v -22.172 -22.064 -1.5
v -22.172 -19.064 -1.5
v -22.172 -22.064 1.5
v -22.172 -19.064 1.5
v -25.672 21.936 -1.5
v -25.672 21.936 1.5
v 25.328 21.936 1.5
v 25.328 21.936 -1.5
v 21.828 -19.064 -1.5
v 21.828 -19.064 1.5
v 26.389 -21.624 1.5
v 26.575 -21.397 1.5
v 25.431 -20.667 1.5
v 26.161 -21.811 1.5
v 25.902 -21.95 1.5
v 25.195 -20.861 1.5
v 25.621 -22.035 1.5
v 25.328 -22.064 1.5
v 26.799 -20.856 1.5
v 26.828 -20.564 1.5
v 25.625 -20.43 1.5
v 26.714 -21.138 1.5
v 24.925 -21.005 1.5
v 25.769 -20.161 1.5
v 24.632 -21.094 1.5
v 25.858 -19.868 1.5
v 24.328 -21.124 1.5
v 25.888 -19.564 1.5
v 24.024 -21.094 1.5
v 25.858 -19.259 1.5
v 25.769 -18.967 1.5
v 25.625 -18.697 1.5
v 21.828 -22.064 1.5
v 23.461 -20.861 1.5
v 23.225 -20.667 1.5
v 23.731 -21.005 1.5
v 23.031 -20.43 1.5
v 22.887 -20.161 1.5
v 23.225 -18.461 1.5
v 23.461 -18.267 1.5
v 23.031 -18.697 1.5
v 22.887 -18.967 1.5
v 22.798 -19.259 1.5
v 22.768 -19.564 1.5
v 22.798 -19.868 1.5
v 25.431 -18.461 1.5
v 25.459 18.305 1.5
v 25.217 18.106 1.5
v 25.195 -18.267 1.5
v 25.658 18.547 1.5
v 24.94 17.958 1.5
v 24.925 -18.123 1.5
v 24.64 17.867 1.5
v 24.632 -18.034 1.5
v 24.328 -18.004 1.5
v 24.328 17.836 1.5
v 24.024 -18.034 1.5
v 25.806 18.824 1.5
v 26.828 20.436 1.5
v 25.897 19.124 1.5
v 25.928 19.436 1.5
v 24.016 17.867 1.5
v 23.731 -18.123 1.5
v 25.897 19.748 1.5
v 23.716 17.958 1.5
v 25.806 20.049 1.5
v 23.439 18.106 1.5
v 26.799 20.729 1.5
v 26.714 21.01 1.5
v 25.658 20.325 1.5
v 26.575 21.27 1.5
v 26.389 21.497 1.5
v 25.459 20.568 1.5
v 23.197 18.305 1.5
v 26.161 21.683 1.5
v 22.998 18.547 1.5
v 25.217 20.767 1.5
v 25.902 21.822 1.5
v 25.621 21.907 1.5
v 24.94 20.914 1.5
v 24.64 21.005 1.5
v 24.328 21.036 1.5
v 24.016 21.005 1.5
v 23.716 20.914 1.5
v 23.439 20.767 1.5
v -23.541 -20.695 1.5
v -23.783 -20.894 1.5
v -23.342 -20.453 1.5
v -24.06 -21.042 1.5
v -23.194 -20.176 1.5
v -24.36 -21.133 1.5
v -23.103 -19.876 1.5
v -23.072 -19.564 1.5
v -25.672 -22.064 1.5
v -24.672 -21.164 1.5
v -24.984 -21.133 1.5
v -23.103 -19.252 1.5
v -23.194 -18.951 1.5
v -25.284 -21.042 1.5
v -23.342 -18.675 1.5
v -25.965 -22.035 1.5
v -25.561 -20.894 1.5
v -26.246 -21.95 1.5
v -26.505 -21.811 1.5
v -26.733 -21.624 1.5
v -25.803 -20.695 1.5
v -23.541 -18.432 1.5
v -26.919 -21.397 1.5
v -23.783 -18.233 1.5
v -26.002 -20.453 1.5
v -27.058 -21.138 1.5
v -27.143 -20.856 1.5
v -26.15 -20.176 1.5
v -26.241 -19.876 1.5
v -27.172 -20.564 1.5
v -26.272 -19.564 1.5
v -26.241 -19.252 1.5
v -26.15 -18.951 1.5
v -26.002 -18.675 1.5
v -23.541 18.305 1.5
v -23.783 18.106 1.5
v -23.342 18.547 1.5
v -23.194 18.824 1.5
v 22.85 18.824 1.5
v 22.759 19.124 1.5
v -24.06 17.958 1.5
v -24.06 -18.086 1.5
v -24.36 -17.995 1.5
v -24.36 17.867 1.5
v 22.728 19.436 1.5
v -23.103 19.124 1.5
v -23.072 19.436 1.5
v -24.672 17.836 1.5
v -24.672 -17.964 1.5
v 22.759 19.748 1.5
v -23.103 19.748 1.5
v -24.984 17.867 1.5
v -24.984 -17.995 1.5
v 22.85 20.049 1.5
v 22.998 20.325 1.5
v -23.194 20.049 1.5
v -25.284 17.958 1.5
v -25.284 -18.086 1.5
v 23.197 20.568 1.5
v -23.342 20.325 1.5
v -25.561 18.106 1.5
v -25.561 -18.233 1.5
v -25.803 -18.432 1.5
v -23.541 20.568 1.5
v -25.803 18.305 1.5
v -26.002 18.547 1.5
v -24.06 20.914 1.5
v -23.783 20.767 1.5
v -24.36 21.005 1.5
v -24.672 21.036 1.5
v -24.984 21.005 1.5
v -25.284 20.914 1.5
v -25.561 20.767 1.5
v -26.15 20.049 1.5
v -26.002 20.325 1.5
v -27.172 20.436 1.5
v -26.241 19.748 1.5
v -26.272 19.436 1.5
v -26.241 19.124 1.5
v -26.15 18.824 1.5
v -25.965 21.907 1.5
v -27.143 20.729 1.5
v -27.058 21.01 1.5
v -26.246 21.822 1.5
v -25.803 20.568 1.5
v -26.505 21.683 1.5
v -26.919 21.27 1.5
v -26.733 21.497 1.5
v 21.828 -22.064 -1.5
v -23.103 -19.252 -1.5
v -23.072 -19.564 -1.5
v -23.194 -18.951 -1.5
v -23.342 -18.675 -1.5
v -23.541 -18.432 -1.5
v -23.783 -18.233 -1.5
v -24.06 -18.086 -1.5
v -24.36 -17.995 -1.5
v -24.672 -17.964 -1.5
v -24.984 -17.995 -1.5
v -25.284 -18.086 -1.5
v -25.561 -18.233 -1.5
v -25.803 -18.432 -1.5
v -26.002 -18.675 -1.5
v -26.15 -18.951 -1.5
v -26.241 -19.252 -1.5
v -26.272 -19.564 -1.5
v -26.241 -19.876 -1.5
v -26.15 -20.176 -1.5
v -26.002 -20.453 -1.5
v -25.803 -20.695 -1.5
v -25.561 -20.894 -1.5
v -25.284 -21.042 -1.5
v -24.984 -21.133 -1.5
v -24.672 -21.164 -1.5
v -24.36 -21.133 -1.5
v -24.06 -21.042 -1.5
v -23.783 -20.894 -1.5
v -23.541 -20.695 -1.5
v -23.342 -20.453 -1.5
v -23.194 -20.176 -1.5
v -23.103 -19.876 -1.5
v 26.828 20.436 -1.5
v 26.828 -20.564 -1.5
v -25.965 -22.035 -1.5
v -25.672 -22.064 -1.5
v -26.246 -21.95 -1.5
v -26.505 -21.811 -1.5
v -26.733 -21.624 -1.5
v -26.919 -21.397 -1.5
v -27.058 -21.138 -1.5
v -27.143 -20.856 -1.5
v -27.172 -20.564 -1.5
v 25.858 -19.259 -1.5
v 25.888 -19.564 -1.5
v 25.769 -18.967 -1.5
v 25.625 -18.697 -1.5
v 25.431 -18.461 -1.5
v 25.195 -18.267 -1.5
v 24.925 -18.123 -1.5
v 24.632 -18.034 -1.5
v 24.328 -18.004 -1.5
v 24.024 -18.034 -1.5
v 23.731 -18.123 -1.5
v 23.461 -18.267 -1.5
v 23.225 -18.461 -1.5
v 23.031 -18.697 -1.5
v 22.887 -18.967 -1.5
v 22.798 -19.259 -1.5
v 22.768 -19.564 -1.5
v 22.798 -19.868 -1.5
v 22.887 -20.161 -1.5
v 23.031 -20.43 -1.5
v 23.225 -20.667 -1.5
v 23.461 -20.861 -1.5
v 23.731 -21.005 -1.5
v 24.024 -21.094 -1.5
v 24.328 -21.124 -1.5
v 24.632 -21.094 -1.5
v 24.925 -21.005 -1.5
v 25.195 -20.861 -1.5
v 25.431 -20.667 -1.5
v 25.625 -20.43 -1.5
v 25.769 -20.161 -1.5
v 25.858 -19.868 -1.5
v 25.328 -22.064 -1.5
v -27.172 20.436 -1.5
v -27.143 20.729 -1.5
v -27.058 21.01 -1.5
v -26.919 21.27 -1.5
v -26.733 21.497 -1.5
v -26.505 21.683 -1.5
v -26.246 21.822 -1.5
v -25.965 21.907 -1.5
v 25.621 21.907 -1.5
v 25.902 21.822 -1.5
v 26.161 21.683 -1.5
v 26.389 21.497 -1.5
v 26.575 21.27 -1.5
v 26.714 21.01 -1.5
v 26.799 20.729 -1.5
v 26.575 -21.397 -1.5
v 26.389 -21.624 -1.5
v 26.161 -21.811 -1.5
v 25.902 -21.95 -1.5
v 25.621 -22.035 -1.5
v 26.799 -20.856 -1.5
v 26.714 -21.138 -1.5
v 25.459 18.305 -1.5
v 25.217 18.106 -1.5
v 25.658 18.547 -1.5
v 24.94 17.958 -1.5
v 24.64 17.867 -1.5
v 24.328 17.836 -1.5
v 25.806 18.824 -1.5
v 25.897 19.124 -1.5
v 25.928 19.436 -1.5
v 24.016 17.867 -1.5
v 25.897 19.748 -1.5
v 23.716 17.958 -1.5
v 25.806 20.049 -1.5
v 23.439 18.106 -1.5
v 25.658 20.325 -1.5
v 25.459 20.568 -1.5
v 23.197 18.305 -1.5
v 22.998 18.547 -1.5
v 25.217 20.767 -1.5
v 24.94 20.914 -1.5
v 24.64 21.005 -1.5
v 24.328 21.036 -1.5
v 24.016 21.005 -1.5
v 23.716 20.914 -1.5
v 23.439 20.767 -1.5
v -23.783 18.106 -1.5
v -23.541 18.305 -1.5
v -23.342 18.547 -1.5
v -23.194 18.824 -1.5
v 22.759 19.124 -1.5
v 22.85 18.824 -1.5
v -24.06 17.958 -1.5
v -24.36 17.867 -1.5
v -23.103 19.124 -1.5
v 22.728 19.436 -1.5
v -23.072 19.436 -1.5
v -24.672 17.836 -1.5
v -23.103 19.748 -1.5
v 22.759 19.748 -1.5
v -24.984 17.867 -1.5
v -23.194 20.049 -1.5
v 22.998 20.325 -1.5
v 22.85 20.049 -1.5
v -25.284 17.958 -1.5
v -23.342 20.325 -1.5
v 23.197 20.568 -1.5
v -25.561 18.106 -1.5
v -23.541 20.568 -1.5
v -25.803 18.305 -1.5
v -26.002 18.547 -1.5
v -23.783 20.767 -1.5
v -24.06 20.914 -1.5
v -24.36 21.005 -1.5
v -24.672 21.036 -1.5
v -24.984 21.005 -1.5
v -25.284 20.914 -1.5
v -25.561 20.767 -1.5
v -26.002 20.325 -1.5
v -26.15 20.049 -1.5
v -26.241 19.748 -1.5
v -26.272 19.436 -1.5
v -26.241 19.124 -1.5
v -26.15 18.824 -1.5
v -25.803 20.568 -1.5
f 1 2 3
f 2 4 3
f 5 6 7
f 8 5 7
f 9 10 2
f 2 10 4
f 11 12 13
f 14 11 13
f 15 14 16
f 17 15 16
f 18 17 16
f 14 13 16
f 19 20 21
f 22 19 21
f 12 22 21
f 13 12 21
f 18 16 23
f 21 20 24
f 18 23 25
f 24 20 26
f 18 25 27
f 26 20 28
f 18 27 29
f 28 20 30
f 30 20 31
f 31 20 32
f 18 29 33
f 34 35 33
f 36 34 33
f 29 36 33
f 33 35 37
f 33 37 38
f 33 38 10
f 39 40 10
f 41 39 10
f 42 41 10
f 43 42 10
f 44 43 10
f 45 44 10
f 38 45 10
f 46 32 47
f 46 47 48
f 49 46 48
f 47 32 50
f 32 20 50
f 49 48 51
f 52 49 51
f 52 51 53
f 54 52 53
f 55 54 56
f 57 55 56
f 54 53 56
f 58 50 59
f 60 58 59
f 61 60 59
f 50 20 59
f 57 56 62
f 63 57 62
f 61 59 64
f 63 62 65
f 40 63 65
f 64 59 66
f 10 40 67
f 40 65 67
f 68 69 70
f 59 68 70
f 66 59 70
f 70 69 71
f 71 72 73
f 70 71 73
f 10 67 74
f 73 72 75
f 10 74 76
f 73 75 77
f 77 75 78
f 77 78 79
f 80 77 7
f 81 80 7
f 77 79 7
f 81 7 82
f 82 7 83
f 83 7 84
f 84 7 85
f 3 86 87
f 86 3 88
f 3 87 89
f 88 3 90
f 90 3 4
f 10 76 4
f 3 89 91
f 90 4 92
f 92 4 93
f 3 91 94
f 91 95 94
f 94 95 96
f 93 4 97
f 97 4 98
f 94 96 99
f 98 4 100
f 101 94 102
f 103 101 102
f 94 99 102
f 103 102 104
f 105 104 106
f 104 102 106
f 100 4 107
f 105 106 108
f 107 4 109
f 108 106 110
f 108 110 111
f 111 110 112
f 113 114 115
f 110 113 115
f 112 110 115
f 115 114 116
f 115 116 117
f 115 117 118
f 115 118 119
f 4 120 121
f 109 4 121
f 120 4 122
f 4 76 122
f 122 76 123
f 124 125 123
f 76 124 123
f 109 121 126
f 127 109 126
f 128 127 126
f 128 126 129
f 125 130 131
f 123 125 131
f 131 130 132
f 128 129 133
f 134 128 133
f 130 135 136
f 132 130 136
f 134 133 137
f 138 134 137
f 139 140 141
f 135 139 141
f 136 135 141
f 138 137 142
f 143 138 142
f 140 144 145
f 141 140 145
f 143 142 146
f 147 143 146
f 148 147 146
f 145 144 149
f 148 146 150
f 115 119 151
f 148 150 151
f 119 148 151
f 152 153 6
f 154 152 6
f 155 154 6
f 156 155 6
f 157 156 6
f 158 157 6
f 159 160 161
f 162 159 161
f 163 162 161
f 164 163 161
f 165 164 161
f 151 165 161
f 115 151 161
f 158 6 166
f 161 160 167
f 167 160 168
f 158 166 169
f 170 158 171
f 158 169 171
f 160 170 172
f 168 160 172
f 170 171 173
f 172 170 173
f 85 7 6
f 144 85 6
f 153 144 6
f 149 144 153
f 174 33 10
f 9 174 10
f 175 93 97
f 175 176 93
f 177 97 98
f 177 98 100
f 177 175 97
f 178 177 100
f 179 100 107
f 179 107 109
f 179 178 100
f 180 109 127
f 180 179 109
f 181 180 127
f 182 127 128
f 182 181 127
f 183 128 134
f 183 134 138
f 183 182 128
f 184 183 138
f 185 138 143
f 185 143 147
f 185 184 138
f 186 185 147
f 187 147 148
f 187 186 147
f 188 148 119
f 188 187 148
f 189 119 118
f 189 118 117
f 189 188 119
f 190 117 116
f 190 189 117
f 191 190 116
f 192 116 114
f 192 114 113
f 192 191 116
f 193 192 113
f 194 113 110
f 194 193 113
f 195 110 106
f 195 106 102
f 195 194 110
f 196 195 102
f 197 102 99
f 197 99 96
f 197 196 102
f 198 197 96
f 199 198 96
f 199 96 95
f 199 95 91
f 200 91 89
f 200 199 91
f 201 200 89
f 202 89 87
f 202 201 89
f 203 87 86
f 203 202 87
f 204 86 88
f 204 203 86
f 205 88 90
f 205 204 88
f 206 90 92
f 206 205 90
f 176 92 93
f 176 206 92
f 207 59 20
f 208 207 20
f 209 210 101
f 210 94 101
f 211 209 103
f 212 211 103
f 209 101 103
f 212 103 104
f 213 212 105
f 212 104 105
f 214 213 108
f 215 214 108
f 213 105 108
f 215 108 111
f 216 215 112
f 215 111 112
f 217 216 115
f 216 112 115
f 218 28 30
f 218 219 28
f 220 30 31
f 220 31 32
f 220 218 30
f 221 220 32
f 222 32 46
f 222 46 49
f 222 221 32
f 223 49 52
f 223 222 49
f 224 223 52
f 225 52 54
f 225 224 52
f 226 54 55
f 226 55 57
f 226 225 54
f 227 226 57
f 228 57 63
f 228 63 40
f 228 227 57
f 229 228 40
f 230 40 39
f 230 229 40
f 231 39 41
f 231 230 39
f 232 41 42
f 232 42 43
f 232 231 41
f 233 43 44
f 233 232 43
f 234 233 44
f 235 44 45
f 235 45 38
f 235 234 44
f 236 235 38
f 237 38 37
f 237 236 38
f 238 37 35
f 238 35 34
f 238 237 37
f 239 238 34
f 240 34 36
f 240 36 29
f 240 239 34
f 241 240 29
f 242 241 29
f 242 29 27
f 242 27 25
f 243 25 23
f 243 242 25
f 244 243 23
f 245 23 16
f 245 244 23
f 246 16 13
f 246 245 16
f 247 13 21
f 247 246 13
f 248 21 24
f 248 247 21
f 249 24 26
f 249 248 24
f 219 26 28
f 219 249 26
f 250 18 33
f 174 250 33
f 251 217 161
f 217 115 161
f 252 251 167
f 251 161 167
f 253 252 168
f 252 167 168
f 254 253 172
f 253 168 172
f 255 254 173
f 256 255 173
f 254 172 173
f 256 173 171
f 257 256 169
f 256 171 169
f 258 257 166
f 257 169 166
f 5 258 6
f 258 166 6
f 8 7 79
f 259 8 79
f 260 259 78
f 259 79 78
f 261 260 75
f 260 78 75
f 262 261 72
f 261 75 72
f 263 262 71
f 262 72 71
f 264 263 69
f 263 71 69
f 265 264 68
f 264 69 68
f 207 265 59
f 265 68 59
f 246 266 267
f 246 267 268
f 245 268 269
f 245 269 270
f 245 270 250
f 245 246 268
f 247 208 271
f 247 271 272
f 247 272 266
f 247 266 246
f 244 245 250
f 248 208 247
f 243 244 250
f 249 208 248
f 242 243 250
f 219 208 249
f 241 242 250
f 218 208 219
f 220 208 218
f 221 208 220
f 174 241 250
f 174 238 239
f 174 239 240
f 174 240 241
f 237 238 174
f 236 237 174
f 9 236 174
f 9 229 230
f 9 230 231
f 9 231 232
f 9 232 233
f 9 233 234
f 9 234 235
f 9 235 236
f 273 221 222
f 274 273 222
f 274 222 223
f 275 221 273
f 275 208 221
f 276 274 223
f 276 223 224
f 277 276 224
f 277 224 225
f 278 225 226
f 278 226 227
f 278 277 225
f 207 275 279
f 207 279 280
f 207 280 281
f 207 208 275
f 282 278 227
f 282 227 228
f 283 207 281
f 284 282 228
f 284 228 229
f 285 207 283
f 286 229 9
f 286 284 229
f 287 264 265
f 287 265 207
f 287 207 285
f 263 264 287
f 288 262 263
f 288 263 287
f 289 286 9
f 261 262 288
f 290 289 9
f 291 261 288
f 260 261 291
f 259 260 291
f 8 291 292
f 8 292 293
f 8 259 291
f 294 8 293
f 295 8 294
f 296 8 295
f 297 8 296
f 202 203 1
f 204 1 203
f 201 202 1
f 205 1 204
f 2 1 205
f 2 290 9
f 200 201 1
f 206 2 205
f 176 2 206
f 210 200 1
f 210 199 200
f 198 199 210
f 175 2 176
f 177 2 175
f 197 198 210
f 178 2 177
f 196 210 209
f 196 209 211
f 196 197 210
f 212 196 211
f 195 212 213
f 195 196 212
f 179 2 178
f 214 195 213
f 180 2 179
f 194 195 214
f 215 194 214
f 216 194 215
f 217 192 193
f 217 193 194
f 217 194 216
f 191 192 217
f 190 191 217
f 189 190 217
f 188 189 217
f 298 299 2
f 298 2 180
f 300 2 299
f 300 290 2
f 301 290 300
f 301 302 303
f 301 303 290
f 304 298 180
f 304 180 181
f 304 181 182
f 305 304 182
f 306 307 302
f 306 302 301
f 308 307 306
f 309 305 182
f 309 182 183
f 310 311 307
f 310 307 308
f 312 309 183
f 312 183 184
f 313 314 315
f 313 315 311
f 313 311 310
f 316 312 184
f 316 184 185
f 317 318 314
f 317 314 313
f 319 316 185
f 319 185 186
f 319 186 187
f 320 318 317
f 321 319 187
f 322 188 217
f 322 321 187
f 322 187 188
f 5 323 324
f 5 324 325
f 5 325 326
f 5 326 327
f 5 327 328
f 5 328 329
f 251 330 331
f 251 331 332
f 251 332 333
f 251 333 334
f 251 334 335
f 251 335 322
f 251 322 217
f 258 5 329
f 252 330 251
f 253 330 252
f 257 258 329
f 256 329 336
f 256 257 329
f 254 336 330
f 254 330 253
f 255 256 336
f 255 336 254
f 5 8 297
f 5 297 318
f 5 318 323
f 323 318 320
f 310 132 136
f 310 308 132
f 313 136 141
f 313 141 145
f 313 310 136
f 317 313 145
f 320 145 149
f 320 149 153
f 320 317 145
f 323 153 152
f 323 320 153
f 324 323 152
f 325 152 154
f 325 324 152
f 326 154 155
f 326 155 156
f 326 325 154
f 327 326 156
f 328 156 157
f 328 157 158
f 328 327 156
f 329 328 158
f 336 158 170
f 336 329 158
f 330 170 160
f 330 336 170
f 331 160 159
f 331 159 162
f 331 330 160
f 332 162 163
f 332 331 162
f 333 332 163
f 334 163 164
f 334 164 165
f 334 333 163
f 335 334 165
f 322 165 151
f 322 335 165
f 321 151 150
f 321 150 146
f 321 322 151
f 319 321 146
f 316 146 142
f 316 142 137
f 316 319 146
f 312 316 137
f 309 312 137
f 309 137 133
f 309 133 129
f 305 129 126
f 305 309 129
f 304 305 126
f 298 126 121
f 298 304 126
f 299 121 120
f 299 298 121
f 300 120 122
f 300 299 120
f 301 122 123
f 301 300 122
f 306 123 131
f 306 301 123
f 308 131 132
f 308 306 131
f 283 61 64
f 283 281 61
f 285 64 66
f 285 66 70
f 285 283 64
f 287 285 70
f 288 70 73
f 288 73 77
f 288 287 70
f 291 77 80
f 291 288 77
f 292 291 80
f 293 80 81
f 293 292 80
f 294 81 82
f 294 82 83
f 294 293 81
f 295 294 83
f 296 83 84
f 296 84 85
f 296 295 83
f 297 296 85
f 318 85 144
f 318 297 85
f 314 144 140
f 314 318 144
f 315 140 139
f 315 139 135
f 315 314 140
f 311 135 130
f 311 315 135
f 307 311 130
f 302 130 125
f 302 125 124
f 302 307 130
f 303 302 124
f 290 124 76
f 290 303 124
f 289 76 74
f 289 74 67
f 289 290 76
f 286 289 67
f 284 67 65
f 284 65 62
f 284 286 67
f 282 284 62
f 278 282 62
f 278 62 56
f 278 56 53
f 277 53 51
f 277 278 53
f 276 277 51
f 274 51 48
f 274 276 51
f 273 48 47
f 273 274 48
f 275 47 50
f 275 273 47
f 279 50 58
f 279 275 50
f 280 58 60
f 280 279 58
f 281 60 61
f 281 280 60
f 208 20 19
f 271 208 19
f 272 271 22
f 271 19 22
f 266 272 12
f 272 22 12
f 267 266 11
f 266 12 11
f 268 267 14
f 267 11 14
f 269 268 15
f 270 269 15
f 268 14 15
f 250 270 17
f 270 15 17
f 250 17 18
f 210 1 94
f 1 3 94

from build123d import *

# Parameters (mm, degrees)
SKETCH1_R           = 1.6
SKETCH1_R_2         = 1.559740896
BOSS_EXTRUDE1_DEPTH = 1.5


with BuildPart() as part:
    # Sketch1 → Boss-Extrude1 (new, symmetric)
    with BuildSketch(Plane.XY):
        with BuildLine():
            Line((22.828032498, -22.06376378), (21.828032498, -22.06376378))
            Line((21.828032498, -22.06376378), (21.828032498, -19.06376378))
            Line((21.828032498, -19.06376378), (-22.171967502, -19.06376378))
            Line((-22.171967502, -19.06376378), (-22.171967502, -22.06376378))
            Line((-22.171967502, -22.06376378), (-23.171967502, -22.06376378))
            Line((-23.171967502, -22.06376378), (-25.671967502, -22.06376378))
            ThreePointArc((-25.671967502, -22.06376378), (-26.732627674, -21.624423952), (-27.171967502, -20.56376378))
            Line((-27.171967502, -20.56376378), (-27.171967502, 20.43623622))
            ThreePointArc((-27.171967502, 20.43623622), (-26.732627674, 21.496896392), (-25.671967502, 21.93623622))
            Line((-25.671967502, 21.93623622), (25.328032498, 21.93623622))
            ThreePointArc((25.328032498, 21.93623622), (26.38869267, 21.496896392), (26.828032498, 20.43623622))
            Line((26.828032498, 20.43623622), (26.828032498, -20.56376378))
            ThreePointArc((26.828032498, -20.56376378), (26.38869267, -21.624423952), (25.328032498, -22.06376378))
            Line((25.328032498, -22.06376378), (22.828032498, -22.06376378))
        make_face()
        with Locations((-24.671967502, 19.43623622)):
            Circle(SKETCH1_R, mode=Mode.SUBTRACT)
        with Locations((24.328032498, 19.43623622)):
            Circle(SKETCH1_R, mode=Mode.SUBTRACT)
        with Locations((24.328032498, -19.56376378)):
            Circle(SKETCH1_R_2, mode=Mode.SUBTRACT)
        with Locations((-24.671967502, -19.56376378)):
            Circle(SKETCH1_R, mode=Mode.SUBTRACT)
    extrude(amount=BOSS_EXTRUDE1_DEPTH, both=True)


solid = part.part
